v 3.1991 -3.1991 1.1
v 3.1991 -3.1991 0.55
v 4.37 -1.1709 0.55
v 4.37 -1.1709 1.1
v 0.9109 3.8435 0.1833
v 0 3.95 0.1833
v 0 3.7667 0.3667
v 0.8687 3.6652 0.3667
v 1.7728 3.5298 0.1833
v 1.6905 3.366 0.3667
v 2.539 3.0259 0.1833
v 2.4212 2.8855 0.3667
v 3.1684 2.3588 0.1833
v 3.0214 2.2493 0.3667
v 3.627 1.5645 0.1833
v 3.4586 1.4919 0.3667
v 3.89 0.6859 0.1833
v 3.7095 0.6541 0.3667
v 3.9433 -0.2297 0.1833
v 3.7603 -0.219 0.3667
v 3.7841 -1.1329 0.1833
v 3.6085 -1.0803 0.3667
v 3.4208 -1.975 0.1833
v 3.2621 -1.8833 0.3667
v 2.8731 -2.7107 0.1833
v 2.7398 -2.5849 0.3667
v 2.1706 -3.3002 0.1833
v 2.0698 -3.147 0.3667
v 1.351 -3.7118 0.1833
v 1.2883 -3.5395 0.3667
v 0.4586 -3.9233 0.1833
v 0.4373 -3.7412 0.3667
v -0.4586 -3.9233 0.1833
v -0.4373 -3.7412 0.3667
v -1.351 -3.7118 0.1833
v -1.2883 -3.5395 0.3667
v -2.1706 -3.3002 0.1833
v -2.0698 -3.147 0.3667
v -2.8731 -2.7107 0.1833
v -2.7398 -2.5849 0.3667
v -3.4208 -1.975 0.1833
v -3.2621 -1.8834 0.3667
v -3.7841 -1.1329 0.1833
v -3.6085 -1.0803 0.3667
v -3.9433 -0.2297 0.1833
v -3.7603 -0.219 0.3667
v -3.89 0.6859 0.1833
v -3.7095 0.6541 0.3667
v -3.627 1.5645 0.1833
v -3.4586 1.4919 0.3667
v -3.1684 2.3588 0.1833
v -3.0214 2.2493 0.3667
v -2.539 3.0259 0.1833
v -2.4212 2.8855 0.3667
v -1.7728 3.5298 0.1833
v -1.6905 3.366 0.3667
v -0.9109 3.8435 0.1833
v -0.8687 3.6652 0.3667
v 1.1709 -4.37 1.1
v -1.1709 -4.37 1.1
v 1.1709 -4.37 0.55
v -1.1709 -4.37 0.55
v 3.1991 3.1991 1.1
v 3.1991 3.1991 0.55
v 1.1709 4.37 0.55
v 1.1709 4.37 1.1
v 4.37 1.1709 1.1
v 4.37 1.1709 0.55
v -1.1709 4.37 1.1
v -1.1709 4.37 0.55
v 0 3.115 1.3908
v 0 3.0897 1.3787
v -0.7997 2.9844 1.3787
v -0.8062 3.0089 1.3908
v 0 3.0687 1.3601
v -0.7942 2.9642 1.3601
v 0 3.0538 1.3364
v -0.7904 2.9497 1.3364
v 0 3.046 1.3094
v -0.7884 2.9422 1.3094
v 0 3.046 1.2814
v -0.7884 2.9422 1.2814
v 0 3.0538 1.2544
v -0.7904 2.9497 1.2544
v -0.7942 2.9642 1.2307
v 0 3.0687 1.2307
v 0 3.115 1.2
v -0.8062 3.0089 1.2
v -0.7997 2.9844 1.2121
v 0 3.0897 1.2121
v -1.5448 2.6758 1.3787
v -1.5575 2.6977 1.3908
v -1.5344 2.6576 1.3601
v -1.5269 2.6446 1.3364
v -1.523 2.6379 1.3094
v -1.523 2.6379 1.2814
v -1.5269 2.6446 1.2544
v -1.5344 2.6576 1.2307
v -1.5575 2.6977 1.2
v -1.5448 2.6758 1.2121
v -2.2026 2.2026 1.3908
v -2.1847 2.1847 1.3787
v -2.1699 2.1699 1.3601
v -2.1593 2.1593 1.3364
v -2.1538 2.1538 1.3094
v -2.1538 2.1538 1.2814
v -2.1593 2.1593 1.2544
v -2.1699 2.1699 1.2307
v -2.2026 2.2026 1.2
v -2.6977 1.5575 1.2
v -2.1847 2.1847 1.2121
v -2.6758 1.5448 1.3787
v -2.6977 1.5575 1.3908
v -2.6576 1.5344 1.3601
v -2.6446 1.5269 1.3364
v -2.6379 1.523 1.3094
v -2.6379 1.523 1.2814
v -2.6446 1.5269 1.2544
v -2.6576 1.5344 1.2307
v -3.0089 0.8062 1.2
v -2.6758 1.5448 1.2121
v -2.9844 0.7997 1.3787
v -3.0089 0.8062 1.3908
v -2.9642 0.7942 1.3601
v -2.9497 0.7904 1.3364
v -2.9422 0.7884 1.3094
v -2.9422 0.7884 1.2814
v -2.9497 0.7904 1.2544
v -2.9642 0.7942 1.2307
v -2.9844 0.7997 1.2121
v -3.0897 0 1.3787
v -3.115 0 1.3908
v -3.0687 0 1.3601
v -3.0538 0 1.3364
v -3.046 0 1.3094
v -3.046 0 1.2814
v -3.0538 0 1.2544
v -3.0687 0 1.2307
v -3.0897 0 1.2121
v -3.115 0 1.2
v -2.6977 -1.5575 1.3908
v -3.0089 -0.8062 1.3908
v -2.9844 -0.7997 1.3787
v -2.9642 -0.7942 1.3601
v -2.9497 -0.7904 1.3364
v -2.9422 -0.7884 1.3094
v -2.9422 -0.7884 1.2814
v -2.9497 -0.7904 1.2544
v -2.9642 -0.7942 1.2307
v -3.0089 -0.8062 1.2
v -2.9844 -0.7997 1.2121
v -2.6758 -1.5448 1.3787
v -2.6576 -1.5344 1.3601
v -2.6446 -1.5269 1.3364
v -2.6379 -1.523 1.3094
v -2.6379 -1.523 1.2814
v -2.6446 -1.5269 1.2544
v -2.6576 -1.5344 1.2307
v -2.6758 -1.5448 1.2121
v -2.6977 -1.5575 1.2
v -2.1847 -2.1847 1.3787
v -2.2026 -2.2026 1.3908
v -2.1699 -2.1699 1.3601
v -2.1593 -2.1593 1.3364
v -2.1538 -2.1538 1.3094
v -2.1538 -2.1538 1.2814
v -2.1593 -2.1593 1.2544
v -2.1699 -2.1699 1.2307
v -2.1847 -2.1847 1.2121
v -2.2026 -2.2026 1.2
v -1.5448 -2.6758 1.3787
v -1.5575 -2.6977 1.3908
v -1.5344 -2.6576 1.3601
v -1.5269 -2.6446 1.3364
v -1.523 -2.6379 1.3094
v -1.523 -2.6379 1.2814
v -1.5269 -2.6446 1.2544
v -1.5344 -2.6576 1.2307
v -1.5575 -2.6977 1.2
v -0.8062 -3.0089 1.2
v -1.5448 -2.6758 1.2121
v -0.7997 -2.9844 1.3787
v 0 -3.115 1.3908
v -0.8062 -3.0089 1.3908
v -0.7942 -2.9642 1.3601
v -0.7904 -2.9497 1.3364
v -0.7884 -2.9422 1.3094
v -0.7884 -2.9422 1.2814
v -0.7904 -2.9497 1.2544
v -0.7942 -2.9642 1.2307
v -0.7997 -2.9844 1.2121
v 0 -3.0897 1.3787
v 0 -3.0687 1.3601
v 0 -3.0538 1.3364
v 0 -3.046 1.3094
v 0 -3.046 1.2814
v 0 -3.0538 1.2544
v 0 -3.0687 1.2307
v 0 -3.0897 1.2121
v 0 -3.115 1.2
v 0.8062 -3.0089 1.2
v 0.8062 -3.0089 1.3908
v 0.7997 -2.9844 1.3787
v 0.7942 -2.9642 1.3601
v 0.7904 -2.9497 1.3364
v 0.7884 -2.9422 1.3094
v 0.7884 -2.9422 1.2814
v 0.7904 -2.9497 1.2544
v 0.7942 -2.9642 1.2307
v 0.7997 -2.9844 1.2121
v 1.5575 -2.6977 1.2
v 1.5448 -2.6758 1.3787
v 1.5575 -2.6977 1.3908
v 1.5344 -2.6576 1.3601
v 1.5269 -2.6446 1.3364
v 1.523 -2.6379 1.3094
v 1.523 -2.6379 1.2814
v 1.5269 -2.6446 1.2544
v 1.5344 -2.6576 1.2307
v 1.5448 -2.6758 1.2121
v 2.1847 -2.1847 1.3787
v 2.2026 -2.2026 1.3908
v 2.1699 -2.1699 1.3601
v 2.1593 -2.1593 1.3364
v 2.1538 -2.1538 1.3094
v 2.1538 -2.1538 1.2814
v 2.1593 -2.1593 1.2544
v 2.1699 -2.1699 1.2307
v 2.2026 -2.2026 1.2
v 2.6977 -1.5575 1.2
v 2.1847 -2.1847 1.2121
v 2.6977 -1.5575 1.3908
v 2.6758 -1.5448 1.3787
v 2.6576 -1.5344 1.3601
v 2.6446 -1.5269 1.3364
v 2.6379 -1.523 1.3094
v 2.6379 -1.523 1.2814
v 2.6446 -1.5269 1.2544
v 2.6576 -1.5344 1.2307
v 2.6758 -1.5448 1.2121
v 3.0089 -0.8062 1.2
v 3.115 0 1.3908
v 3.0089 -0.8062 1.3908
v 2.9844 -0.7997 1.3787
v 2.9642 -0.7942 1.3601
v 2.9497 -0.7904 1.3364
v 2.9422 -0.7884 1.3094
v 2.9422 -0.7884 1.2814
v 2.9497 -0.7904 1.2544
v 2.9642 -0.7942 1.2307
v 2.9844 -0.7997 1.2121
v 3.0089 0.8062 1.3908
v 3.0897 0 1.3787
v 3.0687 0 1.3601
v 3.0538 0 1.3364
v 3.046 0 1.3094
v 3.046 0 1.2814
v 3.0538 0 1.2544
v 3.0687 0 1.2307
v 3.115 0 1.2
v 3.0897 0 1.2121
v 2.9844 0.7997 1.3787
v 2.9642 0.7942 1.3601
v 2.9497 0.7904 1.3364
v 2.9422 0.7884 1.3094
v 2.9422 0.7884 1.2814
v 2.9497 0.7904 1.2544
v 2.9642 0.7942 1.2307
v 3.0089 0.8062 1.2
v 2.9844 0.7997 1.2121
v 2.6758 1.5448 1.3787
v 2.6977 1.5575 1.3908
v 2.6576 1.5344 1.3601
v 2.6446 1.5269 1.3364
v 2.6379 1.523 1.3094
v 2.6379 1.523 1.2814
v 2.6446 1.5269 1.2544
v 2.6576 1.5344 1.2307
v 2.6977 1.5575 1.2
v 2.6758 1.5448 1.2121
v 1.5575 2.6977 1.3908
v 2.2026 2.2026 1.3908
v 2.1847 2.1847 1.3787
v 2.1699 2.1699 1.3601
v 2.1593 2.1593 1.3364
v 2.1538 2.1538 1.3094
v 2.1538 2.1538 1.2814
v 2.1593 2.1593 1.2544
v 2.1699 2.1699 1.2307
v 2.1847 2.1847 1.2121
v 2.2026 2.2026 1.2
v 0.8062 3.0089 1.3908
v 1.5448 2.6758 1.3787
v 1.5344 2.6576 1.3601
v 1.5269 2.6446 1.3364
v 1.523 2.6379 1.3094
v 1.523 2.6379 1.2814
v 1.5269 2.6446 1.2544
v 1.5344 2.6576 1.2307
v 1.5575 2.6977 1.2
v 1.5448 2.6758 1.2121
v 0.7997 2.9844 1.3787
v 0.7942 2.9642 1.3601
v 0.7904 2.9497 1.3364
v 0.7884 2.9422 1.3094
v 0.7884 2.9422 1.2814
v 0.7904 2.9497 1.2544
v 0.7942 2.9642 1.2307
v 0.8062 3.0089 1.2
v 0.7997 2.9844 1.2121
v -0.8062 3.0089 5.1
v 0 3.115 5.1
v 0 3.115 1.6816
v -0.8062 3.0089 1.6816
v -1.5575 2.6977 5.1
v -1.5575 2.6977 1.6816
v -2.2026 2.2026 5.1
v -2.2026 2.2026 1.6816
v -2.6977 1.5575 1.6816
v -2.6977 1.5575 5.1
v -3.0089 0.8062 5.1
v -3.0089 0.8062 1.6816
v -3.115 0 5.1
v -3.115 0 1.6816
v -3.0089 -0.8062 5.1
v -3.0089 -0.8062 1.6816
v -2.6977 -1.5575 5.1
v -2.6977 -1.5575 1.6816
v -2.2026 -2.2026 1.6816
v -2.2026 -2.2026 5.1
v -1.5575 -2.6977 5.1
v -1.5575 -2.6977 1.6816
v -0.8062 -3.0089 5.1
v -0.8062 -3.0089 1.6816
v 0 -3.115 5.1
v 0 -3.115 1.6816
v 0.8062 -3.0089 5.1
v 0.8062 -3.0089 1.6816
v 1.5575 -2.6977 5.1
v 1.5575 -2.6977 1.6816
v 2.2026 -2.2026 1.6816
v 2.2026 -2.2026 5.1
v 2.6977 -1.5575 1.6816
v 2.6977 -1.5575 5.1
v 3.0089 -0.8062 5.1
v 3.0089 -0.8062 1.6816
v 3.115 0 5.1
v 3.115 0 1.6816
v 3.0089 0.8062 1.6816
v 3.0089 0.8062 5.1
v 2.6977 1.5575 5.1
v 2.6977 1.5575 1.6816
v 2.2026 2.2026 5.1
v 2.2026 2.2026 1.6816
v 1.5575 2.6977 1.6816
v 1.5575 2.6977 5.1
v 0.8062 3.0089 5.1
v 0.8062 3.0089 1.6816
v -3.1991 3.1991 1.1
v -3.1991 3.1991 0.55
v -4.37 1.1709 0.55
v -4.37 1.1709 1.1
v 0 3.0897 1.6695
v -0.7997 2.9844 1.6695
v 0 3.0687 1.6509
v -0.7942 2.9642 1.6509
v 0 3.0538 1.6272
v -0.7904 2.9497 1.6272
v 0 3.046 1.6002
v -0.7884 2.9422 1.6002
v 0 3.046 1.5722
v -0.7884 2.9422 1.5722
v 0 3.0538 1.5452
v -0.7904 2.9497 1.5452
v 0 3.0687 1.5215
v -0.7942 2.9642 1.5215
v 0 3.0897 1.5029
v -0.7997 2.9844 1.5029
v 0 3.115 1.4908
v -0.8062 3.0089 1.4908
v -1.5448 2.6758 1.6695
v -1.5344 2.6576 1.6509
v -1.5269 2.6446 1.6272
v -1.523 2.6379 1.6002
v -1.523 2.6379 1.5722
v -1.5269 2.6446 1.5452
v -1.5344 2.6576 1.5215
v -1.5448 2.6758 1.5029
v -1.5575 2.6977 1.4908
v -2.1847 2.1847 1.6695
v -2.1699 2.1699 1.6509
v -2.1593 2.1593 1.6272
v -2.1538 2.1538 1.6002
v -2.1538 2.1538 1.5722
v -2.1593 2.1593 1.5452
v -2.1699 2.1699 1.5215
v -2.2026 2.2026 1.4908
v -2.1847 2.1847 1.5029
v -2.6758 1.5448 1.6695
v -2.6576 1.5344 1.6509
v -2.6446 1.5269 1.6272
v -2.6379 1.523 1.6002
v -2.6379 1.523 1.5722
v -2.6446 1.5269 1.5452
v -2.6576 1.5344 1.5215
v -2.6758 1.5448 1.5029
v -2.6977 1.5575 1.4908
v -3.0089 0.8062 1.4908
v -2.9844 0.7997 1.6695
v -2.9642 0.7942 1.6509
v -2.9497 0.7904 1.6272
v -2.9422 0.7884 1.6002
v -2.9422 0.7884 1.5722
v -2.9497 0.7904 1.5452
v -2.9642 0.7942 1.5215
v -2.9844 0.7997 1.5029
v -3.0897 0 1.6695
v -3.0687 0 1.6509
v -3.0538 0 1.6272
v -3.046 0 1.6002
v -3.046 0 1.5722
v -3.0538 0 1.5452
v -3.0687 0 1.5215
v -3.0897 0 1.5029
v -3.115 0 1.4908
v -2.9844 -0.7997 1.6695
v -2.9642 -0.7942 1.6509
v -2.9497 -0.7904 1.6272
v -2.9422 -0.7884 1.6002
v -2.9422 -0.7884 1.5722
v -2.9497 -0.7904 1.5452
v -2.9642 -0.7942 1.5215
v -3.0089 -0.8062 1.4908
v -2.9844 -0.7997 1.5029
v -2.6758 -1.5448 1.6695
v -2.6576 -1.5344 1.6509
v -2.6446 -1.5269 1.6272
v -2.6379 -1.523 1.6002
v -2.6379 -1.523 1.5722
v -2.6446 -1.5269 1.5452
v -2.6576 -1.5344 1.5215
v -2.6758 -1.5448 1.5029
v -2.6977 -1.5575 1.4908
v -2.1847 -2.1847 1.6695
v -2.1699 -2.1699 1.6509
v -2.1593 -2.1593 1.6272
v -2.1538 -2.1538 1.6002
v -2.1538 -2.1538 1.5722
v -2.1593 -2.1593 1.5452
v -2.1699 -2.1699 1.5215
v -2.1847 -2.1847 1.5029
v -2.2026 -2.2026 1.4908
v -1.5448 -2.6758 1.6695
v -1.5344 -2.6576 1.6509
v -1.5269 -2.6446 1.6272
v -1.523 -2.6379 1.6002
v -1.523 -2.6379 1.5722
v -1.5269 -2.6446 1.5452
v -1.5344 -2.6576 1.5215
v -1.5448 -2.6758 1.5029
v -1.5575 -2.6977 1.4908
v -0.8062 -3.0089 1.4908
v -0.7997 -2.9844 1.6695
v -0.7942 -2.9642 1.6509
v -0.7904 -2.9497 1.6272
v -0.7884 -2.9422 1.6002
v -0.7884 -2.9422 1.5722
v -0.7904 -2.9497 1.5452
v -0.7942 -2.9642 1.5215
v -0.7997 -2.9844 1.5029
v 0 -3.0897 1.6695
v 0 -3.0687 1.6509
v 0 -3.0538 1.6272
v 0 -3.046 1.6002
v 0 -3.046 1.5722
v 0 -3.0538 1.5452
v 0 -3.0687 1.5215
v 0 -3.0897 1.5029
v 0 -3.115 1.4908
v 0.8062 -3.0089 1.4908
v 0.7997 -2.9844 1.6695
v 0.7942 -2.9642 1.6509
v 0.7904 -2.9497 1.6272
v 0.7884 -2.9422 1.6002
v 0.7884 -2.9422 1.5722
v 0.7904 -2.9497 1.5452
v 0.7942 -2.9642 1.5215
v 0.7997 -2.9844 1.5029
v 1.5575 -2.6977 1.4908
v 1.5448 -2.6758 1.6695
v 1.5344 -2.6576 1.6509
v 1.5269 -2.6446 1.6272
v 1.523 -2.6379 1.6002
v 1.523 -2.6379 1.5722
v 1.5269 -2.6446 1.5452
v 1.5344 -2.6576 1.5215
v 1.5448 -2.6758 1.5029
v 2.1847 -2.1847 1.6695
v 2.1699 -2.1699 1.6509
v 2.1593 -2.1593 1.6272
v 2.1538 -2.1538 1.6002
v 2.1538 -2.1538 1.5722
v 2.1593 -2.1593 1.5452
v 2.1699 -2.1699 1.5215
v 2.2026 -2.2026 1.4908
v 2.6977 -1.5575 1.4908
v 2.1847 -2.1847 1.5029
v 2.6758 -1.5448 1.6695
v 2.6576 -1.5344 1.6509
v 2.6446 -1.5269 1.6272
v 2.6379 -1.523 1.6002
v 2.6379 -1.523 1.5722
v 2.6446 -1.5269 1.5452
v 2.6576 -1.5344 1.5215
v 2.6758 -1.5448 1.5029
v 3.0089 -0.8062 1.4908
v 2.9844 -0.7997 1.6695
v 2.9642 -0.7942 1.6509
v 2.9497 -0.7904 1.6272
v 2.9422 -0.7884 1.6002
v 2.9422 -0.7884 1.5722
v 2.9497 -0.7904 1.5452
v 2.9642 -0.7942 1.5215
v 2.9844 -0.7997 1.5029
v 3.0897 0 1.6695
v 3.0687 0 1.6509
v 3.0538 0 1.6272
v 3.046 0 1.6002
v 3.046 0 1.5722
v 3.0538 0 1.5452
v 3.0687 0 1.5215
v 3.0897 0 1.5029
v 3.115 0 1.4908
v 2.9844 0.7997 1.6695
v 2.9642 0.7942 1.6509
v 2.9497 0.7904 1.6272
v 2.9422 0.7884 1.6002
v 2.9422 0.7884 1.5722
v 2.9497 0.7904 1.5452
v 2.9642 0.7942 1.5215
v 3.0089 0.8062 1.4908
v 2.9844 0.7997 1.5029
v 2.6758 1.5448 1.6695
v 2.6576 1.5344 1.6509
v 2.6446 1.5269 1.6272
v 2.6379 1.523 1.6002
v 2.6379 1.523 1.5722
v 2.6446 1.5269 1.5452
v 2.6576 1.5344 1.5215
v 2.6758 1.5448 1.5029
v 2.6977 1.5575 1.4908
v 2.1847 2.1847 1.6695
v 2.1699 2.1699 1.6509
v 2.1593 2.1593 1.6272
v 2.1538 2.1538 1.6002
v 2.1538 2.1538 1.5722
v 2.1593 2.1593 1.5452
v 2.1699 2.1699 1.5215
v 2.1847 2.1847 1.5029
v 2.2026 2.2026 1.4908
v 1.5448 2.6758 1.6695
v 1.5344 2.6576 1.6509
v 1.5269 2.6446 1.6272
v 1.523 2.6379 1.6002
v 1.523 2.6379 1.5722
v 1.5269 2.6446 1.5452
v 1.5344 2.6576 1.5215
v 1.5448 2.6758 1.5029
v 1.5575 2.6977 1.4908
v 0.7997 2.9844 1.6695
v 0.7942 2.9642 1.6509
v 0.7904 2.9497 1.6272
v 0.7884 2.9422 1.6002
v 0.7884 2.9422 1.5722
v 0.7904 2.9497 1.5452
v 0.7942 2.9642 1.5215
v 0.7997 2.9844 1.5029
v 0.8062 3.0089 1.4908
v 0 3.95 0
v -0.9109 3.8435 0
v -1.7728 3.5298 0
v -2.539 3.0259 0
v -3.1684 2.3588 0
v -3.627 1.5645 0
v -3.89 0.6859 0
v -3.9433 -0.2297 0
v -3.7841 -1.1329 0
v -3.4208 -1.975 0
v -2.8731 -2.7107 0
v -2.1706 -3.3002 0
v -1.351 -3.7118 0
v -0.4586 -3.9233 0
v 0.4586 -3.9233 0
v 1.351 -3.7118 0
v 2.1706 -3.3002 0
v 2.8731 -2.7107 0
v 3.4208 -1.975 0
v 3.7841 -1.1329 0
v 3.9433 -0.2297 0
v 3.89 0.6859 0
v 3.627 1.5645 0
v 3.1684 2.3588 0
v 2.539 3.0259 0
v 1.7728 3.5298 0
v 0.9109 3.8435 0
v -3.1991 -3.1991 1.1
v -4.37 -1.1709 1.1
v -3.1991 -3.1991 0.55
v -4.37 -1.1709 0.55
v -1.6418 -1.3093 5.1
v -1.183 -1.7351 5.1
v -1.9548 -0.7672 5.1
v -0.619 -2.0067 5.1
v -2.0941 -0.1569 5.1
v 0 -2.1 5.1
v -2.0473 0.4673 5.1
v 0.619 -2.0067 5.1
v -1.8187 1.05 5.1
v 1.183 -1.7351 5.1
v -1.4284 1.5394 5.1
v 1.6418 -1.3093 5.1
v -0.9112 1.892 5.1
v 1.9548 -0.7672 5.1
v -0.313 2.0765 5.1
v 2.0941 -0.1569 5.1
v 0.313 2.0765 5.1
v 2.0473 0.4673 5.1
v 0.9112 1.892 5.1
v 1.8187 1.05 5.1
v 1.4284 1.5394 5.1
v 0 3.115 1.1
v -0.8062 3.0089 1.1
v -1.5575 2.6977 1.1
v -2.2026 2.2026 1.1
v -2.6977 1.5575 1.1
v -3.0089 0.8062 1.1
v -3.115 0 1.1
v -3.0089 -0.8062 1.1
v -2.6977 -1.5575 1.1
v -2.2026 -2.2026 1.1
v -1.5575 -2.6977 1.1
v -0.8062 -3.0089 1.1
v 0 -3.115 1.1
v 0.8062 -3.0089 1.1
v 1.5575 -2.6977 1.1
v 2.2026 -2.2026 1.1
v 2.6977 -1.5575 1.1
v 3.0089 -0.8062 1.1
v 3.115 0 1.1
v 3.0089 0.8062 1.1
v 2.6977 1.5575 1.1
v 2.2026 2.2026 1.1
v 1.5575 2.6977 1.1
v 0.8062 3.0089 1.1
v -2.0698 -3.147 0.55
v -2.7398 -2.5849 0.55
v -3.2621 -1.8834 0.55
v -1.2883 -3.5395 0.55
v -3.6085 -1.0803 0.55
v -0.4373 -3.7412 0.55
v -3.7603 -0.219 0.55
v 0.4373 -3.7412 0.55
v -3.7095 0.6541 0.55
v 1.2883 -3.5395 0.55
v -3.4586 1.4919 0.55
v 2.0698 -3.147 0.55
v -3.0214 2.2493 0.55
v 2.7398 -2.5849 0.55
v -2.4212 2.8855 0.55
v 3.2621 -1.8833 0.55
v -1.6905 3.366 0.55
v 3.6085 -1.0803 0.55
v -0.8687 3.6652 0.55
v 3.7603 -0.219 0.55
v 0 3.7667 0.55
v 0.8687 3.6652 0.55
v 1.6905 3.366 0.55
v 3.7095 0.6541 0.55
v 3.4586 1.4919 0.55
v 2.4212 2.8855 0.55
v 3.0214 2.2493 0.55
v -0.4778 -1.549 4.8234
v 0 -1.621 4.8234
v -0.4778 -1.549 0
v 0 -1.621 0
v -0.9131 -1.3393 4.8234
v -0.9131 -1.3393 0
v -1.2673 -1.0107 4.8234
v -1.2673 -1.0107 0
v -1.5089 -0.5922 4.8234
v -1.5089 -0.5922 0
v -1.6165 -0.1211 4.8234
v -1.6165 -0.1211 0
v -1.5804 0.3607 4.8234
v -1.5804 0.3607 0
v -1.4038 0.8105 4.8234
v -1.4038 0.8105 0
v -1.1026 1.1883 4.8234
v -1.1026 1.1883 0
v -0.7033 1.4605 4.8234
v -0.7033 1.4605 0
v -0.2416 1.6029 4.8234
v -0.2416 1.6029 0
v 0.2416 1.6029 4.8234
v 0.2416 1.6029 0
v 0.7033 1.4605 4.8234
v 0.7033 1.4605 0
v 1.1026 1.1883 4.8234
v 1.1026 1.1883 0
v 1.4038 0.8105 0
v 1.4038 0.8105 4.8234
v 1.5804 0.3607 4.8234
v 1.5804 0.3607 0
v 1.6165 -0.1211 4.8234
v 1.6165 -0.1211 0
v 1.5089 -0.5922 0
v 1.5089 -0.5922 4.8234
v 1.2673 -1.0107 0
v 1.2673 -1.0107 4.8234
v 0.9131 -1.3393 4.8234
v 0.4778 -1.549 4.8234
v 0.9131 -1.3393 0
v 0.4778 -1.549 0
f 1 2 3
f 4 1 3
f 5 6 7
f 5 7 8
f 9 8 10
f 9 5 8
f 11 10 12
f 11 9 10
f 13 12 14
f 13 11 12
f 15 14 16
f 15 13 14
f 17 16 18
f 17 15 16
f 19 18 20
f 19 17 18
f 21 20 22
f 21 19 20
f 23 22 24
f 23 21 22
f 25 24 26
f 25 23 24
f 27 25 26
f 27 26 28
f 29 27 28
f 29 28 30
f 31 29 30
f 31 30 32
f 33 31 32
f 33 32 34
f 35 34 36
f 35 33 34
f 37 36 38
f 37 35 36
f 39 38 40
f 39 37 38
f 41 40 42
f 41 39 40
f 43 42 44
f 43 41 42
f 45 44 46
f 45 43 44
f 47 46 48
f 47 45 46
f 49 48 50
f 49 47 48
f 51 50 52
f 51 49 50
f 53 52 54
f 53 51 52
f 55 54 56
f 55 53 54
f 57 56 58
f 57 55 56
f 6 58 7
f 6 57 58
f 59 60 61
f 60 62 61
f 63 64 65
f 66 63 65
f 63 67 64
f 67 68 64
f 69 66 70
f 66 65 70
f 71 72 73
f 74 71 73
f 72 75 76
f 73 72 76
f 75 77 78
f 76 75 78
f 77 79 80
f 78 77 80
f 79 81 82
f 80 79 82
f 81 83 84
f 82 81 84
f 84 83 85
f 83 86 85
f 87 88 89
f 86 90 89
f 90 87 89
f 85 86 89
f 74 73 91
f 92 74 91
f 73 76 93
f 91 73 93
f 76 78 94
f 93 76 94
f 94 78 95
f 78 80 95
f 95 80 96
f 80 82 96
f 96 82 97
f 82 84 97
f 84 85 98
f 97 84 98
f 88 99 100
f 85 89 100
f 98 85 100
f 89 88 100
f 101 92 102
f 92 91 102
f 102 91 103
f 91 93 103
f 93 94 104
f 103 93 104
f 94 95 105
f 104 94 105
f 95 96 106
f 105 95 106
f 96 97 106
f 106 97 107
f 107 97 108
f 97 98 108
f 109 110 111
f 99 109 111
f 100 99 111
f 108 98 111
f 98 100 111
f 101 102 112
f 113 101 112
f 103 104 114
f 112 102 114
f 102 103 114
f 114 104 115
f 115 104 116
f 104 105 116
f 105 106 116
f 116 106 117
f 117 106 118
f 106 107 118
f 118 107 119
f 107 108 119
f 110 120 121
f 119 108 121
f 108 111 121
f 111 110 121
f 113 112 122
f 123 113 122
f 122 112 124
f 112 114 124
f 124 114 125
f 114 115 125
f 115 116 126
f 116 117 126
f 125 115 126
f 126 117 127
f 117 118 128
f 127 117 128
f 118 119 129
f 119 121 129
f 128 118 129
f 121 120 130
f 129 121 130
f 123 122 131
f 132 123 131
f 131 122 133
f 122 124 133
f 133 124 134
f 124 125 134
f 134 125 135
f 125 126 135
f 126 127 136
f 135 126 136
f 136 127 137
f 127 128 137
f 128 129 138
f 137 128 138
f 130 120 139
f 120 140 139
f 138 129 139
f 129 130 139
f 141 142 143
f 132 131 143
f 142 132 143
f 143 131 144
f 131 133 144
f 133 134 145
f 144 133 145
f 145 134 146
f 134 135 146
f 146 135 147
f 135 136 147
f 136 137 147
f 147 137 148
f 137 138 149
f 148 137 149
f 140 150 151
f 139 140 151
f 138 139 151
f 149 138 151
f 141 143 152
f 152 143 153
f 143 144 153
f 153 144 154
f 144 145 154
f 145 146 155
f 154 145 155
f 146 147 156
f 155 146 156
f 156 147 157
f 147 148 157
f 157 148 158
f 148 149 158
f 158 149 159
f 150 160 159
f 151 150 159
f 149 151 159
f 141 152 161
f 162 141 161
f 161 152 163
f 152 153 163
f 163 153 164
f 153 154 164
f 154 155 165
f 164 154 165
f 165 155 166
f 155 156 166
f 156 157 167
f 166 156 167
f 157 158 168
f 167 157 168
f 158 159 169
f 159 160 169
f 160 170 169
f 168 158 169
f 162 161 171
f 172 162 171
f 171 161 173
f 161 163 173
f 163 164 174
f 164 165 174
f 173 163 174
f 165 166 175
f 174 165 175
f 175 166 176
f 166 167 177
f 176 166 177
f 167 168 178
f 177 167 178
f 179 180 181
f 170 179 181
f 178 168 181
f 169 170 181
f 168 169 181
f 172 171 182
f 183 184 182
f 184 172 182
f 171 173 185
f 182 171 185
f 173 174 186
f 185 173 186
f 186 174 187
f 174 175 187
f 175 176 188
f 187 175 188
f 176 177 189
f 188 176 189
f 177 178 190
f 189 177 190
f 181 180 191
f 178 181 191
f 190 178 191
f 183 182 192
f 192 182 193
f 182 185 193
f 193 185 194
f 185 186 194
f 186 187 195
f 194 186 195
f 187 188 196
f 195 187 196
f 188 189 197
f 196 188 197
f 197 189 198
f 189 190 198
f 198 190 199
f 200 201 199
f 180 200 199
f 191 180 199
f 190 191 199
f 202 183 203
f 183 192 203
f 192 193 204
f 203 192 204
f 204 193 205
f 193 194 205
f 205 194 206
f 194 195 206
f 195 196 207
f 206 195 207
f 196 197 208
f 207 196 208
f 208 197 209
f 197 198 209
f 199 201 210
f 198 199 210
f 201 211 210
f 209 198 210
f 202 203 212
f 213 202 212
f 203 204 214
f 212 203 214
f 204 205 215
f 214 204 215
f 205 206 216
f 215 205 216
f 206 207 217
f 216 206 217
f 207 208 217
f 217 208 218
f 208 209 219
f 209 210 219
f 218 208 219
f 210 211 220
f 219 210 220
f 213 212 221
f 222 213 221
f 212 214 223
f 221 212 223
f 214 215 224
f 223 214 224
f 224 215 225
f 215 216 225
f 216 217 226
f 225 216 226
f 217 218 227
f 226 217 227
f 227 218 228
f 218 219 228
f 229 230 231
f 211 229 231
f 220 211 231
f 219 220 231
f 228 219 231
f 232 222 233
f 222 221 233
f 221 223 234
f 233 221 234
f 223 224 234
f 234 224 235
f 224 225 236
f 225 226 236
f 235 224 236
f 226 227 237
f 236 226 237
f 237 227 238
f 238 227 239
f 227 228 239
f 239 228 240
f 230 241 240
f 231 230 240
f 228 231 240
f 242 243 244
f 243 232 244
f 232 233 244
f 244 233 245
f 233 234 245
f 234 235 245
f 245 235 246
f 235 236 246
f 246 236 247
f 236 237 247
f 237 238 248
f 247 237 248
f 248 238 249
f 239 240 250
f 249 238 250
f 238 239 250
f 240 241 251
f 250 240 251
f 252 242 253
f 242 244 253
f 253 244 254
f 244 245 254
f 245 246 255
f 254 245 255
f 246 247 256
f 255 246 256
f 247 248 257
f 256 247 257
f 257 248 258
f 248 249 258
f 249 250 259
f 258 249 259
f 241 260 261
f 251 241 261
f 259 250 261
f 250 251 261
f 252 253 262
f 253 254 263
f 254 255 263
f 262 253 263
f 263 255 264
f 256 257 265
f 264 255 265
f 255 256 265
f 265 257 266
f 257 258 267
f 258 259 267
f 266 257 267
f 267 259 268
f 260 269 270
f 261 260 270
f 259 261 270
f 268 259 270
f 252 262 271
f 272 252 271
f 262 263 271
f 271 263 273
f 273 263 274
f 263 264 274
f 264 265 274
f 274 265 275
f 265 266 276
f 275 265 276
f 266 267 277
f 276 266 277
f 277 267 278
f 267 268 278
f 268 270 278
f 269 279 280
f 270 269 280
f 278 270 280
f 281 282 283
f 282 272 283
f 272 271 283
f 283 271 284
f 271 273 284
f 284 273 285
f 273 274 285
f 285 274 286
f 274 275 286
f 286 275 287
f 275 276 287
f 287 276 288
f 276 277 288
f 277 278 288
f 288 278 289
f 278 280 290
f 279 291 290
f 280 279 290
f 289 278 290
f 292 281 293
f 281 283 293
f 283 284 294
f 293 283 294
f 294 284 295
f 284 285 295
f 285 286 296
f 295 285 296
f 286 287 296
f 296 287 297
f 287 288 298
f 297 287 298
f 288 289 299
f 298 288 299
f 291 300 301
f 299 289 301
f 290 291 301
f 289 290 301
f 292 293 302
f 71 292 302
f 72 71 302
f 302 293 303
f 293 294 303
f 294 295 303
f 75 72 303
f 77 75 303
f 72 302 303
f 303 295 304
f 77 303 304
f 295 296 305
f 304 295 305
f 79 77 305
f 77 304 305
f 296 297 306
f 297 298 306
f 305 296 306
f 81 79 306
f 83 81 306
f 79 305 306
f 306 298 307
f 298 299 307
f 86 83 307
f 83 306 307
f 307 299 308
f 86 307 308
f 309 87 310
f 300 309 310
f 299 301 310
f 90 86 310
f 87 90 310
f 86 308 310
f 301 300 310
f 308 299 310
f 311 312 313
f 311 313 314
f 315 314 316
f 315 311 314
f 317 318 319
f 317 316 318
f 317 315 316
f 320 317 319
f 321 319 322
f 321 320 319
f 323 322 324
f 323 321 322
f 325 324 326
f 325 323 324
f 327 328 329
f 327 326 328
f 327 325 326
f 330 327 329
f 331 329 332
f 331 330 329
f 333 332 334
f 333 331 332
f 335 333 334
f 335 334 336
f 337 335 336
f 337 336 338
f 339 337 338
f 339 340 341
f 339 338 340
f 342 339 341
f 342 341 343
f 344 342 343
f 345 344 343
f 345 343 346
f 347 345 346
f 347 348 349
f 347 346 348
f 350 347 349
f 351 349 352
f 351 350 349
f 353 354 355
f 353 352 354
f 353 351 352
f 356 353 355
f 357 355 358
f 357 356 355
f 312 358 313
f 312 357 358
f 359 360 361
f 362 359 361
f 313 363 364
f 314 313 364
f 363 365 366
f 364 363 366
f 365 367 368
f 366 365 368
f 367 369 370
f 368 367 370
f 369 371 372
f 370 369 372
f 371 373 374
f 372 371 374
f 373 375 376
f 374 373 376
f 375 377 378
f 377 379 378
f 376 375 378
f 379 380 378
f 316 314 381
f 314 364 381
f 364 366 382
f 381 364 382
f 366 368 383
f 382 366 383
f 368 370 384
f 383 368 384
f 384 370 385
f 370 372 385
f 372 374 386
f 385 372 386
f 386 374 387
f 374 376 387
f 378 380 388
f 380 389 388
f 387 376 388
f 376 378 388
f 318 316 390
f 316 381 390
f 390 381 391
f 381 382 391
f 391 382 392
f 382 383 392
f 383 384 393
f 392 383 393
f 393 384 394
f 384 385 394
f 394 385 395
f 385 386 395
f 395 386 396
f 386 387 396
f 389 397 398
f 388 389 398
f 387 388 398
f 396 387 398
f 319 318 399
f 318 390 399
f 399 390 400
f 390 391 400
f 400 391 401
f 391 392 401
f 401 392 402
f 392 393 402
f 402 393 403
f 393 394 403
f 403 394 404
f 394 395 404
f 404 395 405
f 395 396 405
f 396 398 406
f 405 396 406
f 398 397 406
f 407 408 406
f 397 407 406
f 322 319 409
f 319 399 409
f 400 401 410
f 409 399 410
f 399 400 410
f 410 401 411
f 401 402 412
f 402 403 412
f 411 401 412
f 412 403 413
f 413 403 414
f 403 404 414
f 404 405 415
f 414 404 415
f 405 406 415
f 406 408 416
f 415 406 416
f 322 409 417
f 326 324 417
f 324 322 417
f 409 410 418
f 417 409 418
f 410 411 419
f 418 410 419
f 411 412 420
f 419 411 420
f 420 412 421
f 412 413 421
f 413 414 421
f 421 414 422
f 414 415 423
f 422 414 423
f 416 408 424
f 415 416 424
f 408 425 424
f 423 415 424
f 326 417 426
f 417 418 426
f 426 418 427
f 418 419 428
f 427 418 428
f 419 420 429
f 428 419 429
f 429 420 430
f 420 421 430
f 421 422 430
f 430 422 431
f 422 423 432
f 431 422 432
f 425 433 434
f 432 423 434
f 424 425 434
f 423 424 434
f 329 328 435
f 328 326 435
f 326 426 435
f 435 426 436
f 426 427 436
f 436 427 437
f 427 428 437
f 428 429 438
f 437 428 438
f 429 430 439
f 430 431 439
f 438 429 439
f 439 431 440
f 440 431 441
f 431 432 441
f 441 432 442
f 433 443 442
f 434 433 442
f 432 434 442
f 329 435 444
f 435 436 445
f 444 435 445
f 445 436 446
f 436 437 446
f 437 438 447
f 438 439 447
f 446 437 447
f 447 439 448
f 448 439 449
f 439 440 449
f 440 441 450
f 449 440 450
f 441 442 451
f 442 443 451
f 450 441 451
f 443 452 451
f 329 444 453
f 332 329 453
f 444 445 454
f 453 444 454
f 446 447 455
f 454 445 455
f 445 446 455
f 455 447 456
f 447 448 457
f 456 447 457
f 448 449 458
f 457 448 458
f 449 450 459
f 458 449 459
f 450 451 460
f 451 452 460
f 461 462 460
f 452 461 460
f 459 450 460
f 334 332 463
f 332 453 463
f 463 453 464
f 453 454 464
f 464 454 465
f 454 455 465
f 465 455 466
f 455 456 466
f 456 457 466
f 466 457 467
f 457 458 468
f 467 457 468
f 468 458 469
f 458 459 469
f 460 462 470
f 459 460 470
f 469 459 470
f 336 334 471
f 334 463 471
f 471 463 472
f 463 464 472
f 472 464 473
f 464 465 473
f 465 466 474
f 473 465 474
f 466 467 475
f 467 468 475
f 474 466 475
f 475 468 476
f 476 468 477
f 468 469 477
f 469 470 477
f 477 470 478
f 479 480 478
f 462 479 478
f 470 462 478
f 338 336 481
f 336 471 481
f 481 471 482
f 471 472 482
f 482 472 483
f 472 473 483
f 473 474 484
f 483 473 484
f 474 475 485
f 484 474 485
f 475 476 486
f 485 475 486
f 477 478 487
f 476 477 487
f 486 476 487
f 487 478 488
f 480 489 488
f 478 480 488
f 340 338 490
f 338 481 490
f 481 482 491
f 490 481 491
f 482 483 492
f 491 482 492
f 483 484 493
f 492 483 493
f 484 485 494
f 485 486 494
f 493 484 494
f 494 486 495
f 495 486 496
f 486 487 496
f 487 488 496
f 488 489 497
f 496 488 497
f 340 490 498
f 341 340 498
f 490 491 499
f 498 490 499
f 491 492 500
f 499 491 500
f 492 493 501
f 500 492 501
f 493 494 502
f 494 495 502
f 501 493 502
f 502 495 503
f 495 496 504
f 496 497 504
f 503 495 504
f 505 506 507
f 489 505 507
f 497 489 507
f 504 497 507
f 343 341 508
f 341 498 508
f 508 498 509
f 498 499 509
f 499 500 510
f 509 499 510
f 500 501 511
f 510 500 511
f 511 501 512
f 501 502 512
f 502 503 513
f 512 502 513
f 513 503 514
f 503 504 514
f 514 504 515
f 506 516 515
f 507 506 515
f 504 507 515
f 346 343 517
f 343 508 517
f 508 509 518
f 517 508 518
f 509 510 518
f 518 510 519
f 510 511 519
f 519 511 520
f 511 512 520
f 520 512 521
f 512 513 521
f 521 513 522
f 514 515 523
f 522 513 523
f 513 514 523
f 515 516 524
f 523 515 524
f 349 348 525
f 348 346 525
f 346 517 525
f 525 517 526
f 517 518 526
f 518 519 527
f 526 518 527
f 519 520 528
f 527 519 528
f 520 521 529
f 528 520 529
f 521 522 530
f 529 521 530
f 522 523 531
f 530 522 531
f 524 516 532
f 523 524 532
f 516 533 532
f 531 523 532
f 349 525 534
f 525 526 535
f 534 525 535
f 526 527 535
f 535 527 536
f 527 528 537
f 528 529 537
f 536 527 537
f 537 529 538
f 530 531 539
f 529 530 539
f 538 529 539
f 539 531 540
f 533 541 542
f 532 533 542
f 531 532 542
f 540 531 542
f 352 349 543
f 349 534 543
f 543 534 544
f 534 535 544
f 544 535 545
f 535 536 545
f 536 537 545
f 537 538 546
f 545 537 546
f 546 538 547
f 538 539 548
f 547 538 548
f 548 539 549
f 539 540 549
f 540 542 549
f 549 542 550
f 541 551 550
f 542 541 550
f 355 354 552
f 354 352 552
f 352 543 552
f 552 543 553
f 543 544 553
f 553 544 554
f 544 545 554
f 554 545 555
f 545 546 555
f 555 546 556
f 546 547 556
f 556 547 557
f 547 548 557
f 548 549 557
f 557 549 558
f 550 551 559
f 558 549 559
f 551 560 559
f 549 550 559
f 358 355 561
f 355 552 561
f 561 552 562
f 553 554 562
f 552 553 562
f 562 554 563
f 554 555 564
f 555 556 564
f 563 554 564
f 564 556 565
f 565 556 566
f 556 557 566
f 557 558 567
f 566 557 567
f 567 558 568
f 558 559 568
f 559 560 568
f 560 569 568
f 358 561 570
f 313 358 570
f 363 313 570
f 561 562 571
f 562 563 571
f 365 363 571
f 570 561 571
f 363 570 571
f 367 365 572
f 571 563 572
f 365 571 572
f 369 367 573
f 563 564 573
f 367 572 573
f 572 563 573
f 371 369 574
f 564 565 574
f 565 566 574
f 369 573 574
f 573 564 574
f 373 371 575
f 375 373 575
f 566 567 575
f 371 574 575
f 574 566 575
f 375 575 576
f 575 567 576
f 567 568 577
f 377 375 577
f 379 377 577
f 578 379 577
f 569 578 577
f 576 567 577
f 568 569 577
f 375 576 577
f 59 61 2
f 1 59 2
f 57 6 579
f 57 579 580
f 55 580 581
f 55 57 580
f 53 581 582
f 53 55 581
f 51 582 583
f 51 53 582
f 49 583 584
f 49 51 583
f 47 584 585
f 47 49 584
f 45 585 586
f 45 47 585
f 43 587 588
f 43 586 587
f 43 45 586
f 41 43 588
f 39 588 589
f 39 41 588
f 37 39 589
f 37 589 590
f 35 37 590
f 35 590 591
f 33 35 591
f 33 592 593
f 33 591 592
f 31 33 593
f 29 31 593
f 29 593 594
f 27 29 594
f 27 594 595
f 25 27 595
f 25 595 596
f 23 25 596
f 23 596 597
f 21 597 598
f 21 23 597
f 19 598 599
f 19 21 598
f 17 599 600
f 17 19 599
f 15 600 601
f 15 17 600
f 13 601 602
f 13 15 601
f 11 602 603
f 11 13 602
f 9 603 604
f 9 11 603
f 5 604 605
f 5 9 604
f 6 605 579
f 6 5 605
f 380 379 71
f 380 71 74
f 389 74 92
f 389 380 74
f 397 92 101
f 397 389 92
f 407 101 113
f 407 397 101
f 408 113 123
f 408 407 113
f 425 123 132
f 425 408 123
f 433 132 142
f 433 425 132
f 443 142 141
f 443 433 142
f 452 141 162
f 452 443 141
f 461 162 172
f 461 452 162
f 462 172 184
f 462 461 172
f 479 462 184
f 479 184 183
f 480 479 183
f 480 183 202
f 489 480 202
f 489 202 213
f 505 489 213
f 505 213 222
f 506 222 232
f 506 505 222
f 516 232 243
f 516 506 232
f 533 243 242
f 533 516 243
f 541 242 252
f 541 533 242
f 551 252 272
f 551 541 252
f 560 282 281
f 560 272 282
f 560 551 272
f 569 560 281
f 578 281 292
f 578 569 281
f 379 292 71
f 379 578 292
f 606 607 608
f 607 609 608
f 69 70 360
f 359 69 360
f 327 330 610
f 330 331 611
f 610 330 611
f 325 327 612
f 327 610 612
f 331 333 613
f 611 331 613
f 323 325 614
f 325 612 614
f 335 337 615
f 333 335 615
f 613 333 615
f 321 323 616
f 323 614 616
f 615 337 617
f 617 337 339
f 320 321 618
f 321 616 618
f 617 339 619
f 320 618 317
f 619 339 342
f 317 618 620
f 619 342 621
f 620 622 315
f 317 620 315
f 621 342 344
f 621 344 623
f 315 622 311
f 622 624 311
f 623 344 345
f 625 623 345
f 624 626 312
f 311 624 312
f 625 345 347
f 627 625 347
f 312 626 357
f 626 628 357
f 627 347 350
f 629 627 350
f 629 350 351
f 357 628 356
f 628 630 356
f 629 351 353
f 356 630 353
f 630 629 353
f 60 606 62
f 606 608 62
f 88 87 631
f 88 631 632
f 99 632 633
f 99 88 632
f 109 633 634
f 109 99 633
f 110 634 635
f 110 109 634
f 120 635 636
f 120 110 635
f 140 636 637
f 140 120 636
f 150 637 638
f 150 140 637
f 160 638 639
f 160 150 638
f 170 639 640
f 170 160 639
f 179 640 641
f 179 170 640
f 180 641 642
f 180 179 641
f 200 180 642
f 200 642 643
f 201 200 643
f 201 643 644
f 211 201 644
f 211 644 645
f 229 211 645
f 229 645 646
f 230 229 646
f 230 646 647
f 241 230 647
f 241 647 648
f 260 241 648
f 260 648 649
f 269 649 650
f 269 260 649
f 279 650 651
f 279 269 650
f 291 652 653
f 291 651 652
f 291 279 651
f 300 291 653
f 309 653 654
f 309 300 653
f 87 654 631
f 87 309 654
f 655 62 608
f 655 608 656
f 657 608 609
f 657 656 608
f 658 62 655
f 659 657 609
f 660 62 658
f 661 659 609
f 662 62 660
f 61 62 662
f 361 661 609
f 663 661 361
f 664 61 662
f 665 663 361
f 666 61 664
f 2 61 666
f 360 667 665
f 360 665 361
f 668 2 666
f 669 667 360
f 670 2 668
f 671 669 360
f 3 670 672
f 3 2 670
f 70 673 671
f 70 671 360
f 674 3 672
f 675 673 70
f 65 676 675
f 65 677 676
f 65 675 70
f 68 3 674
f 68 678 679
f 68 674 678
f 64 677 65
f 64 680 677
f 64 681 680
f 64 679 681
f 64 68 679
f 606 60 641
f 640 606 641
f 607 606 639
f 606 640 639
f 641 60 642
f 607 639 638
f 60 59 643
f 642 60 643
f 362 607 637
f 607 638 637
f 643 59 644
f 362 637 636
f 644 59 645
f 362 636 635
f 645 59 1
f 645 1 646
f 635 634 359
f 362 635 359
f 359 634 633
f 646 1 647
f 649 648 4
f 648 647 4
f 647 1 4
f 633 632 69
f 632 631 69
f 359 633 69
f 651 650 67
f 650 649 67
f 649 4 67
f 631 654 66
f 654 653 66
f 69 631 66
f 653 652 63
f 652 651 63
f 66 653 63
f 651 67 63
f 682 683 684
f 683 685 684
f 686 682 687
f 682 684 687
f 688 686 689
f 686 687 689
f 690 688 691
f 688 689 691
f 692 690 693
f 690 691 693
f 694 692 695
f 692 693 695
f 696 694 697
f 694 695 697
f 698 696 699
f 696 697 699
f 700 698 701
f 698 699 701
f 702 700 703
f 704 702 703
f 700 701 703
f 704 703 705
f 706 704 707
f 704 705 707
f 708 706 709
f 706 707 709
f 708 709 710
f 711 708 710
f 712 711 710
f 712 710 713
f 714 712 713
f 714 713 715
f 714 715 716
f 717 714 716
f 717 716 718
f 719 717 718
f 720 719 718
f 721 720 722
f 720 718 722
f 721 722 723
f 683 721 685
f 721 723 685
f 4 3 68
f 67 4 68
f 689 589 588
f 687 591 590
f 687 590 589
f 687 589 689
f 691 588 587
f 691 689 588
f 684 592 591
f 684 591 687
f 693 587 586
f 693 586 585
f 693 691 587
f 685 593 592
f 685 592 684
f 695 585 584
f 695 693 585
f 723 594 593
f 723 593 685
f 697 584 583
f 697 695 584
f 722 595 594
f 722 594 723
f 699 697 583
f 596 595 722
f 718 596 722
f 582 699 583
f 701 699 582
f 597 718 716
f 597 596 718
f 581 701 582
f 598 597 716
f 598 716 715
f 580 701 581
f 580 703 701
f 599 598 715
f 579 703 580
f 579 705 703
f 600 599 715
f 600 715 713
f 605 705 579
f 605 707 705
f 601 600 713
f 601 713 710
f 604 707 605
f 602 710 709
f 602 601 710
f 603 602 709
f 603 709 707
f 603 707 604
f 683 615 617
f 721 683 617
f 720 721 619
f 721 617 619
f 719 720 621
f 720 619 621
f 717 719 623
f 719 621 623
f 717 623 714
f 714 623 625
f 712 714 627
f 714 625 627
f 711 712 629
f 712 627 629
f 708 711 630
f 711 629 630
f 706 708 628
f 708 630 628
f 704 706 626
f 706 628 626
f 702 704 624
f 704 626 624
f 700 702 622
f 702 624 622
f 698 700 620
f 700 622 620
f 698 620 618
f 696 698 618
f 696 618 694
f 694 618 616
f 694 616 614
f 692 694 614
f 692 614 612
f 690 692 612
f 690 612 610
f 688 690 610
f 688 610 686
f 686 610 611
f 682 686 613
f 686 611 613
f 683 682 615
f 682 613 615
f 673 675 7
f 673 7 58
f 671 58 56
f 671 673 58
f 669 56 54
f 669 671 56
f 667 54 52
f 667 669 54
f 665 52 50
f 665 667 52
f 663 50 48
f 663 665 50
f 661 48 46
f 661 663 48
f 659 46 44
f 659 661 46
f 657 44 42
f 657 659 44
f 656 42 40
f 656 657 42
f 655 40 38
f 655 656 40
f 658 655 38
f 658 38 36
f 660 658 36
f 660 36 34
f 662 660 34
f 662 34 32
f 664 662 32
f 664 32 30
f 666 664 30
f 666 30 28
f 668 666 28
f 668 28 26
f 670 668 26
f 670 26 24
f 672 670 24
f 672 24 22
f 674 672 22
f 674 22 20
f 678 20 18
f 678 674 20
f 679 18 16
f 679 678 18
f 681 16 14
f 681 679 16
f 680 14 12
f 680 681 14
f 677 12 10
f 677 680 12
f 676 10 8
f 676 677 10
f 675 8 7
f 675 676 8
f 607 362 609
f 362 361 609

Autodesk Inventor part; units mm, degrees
ref_plane "YZ Plane" through (0, 0, 0) normal (1, 0, 0) x (0, 1, 0)
ref_plane "XZ Plane" through (0, 0, 0) normal (0, 1, 0) x (-1, 0, 0)
ref_plane "XY Plane" through (0, 0, 0) normal (0, 0, 1) x (1, 0, 0)
sketch "Sketch1" plane through (0, 0, 0) normal (1, 0, 0) x (0, 1, 0)
  line L0 (0, 0) -> (3.95, 0)
  line L1 (3.95, 0) -> (3.95, 0.1833)
  line L2 (3.95, 0.1833) -> (3.7667, 0.3667)
  line L3 (3.7667, 0.3667) -> (3.7667, 0.55)
  line L4 (3.7667, 0.55) -> (6.555, 0.55)
  line L5 (6.555, 0.55) -> (6.555, 1.1)
  line L6 (6.555, 1.1) -> (3.115, 1.1)
  line L7 (3.115, 1.1) -> (3.115, 1.2)
  arc A0 (3.115, 1.3908) -> (3.115, 1.2) centre (3.145, 1.2954) ccw
  line L8 (3.115, 1.6816) -> (3.115, 5.1)
  line L9 (3.115, 5.1) -> (0, 5.1)
  line L10 (0, 5.1) -> (0, 0)
  arc A1 (3.115, 1.6816) -> (3.115, 1.4908) centre (3.145, 1.5862) ccw
  line L11 (3.115, 1.3908) -> (3.115, 1.4908)
  dimension "d0" = 7.9
  dimension "d1" = 1.1
  dimension "d2" = 6.23
  dimension "d3" = 13.11
  dimension "d4" = 4
  dimension "d5" = 0.1
  dimension "d6" = 0.55
  dimension "d7" = 0.1833
  dimension "d8" = 0.1833
  dimension "d9" = 0.1833
  dimension "d10" = 0.03
  dimension "d11" = 0.1
  dimension "d12" = 0.1
revolve "Revolution1" add sketch "Sketch1" angle 360 about axis through (0, 0, 5.1) along (0, 0, -1)
sketch "Sketch2" plane through (0, 0, 0.55) normal (0, 0, -1) x (-1, 0, 0)
  line L0 (1.1709, 4.37) -> (3.1991, 3.1991)
  line L1 (3.1991, 3.1991) -> (4.37, 1.1709)
  line L2 (4.37, 1.1709) -> (4.37, -1.1709)
  line L3 (4.37, -1.1709) -> (3.1991, -3.1991)
  line L4 (3.1991, -3.1991) -> (1.1709, -4.37)
  line L5 (1.1709, -4.37) -> (-1.1709, -4.37)
  line L6 (-1.1709, -4.37) -> (-3.1991, -3.1991)
  line L7 (-3.1991, -3.1991) -> (-4.37, -1.1709)
  line L8 (-4.37, -1.1709) -> (-4.37, 1.1709)
  line L9 (-4.37, 1.1709) -> (-3.1991, 3.1991)
  line L10 (-3.1991, 3.1991) -> (-1.1709, 4.37)
  line L11 (-1.1709, 4.37) -> (1.1709, 4.37)
  circle A0 centre (0, 0) radius 6.555 projected
  dimension "d16" = 8.74
extrude "Extrusion1" cut sketch "Sketch2" against normal through all
hole "Hole1" at (0, 0, 5.1) direction (0, 0, -1) diameter 3.242 end through all countersink diameter 4.2 countersink angle 120 thread size "M4x0.7" class "6H" standard "ANSI Metric M Profile"
hole "Hole2" [suppressed]
equation "\"d0\" = C_"
equation "\"d1\" = A_"
equation "\"d2\" = B"
equation "\"d3\" = 1.5 * H_"
equation "\"d4\" = Length_Code"
equation "\"d5\" = Mark_1"
equation "\"d6\" = 0.5 * A_"
equation "\"d7\" = 0.166667 * A_"
equation "\"d8\" = 0.166667 * A_"
equation "\"d9\" = 0.166667 * A_"
equation "\"d10\" = Mark_2"
equation "\"d11\" = Mark_1"
equation "\"d12\" = Mark_1"
equation "\"d13\" = T_"
equation "\"d14\" = 1.05 * Thread"
equation "\"d53\" = Length_Code"
equation "\"d18\" = 1.05 * Thread"
equation "\"d20\" = T_"
equation "\"d16\" = H_"
equation "\"Length_Code\" = 4"
equation "\"T_\" = 4"
equation "\"A_\" = 1.1"
equation "\"B\" = 6.23"
equation "\"C_\" = 7.9"
equation "\"H_\" = 8.74"
equation "\"Mark_1\" = 0.1"
equation "\"Mark_2\" = 0.03"
equation "\"Thread\" = 4"
equation "\"Min_Thick\" = 1.6"
equation "\"B_Hole\" = 7.92"
equation "\"Min_Depht\" = 1.1"
equation "\"Min_Dist\" = 6.4"
properties part number "CSS-M4-4" material "Stainless Steel"
